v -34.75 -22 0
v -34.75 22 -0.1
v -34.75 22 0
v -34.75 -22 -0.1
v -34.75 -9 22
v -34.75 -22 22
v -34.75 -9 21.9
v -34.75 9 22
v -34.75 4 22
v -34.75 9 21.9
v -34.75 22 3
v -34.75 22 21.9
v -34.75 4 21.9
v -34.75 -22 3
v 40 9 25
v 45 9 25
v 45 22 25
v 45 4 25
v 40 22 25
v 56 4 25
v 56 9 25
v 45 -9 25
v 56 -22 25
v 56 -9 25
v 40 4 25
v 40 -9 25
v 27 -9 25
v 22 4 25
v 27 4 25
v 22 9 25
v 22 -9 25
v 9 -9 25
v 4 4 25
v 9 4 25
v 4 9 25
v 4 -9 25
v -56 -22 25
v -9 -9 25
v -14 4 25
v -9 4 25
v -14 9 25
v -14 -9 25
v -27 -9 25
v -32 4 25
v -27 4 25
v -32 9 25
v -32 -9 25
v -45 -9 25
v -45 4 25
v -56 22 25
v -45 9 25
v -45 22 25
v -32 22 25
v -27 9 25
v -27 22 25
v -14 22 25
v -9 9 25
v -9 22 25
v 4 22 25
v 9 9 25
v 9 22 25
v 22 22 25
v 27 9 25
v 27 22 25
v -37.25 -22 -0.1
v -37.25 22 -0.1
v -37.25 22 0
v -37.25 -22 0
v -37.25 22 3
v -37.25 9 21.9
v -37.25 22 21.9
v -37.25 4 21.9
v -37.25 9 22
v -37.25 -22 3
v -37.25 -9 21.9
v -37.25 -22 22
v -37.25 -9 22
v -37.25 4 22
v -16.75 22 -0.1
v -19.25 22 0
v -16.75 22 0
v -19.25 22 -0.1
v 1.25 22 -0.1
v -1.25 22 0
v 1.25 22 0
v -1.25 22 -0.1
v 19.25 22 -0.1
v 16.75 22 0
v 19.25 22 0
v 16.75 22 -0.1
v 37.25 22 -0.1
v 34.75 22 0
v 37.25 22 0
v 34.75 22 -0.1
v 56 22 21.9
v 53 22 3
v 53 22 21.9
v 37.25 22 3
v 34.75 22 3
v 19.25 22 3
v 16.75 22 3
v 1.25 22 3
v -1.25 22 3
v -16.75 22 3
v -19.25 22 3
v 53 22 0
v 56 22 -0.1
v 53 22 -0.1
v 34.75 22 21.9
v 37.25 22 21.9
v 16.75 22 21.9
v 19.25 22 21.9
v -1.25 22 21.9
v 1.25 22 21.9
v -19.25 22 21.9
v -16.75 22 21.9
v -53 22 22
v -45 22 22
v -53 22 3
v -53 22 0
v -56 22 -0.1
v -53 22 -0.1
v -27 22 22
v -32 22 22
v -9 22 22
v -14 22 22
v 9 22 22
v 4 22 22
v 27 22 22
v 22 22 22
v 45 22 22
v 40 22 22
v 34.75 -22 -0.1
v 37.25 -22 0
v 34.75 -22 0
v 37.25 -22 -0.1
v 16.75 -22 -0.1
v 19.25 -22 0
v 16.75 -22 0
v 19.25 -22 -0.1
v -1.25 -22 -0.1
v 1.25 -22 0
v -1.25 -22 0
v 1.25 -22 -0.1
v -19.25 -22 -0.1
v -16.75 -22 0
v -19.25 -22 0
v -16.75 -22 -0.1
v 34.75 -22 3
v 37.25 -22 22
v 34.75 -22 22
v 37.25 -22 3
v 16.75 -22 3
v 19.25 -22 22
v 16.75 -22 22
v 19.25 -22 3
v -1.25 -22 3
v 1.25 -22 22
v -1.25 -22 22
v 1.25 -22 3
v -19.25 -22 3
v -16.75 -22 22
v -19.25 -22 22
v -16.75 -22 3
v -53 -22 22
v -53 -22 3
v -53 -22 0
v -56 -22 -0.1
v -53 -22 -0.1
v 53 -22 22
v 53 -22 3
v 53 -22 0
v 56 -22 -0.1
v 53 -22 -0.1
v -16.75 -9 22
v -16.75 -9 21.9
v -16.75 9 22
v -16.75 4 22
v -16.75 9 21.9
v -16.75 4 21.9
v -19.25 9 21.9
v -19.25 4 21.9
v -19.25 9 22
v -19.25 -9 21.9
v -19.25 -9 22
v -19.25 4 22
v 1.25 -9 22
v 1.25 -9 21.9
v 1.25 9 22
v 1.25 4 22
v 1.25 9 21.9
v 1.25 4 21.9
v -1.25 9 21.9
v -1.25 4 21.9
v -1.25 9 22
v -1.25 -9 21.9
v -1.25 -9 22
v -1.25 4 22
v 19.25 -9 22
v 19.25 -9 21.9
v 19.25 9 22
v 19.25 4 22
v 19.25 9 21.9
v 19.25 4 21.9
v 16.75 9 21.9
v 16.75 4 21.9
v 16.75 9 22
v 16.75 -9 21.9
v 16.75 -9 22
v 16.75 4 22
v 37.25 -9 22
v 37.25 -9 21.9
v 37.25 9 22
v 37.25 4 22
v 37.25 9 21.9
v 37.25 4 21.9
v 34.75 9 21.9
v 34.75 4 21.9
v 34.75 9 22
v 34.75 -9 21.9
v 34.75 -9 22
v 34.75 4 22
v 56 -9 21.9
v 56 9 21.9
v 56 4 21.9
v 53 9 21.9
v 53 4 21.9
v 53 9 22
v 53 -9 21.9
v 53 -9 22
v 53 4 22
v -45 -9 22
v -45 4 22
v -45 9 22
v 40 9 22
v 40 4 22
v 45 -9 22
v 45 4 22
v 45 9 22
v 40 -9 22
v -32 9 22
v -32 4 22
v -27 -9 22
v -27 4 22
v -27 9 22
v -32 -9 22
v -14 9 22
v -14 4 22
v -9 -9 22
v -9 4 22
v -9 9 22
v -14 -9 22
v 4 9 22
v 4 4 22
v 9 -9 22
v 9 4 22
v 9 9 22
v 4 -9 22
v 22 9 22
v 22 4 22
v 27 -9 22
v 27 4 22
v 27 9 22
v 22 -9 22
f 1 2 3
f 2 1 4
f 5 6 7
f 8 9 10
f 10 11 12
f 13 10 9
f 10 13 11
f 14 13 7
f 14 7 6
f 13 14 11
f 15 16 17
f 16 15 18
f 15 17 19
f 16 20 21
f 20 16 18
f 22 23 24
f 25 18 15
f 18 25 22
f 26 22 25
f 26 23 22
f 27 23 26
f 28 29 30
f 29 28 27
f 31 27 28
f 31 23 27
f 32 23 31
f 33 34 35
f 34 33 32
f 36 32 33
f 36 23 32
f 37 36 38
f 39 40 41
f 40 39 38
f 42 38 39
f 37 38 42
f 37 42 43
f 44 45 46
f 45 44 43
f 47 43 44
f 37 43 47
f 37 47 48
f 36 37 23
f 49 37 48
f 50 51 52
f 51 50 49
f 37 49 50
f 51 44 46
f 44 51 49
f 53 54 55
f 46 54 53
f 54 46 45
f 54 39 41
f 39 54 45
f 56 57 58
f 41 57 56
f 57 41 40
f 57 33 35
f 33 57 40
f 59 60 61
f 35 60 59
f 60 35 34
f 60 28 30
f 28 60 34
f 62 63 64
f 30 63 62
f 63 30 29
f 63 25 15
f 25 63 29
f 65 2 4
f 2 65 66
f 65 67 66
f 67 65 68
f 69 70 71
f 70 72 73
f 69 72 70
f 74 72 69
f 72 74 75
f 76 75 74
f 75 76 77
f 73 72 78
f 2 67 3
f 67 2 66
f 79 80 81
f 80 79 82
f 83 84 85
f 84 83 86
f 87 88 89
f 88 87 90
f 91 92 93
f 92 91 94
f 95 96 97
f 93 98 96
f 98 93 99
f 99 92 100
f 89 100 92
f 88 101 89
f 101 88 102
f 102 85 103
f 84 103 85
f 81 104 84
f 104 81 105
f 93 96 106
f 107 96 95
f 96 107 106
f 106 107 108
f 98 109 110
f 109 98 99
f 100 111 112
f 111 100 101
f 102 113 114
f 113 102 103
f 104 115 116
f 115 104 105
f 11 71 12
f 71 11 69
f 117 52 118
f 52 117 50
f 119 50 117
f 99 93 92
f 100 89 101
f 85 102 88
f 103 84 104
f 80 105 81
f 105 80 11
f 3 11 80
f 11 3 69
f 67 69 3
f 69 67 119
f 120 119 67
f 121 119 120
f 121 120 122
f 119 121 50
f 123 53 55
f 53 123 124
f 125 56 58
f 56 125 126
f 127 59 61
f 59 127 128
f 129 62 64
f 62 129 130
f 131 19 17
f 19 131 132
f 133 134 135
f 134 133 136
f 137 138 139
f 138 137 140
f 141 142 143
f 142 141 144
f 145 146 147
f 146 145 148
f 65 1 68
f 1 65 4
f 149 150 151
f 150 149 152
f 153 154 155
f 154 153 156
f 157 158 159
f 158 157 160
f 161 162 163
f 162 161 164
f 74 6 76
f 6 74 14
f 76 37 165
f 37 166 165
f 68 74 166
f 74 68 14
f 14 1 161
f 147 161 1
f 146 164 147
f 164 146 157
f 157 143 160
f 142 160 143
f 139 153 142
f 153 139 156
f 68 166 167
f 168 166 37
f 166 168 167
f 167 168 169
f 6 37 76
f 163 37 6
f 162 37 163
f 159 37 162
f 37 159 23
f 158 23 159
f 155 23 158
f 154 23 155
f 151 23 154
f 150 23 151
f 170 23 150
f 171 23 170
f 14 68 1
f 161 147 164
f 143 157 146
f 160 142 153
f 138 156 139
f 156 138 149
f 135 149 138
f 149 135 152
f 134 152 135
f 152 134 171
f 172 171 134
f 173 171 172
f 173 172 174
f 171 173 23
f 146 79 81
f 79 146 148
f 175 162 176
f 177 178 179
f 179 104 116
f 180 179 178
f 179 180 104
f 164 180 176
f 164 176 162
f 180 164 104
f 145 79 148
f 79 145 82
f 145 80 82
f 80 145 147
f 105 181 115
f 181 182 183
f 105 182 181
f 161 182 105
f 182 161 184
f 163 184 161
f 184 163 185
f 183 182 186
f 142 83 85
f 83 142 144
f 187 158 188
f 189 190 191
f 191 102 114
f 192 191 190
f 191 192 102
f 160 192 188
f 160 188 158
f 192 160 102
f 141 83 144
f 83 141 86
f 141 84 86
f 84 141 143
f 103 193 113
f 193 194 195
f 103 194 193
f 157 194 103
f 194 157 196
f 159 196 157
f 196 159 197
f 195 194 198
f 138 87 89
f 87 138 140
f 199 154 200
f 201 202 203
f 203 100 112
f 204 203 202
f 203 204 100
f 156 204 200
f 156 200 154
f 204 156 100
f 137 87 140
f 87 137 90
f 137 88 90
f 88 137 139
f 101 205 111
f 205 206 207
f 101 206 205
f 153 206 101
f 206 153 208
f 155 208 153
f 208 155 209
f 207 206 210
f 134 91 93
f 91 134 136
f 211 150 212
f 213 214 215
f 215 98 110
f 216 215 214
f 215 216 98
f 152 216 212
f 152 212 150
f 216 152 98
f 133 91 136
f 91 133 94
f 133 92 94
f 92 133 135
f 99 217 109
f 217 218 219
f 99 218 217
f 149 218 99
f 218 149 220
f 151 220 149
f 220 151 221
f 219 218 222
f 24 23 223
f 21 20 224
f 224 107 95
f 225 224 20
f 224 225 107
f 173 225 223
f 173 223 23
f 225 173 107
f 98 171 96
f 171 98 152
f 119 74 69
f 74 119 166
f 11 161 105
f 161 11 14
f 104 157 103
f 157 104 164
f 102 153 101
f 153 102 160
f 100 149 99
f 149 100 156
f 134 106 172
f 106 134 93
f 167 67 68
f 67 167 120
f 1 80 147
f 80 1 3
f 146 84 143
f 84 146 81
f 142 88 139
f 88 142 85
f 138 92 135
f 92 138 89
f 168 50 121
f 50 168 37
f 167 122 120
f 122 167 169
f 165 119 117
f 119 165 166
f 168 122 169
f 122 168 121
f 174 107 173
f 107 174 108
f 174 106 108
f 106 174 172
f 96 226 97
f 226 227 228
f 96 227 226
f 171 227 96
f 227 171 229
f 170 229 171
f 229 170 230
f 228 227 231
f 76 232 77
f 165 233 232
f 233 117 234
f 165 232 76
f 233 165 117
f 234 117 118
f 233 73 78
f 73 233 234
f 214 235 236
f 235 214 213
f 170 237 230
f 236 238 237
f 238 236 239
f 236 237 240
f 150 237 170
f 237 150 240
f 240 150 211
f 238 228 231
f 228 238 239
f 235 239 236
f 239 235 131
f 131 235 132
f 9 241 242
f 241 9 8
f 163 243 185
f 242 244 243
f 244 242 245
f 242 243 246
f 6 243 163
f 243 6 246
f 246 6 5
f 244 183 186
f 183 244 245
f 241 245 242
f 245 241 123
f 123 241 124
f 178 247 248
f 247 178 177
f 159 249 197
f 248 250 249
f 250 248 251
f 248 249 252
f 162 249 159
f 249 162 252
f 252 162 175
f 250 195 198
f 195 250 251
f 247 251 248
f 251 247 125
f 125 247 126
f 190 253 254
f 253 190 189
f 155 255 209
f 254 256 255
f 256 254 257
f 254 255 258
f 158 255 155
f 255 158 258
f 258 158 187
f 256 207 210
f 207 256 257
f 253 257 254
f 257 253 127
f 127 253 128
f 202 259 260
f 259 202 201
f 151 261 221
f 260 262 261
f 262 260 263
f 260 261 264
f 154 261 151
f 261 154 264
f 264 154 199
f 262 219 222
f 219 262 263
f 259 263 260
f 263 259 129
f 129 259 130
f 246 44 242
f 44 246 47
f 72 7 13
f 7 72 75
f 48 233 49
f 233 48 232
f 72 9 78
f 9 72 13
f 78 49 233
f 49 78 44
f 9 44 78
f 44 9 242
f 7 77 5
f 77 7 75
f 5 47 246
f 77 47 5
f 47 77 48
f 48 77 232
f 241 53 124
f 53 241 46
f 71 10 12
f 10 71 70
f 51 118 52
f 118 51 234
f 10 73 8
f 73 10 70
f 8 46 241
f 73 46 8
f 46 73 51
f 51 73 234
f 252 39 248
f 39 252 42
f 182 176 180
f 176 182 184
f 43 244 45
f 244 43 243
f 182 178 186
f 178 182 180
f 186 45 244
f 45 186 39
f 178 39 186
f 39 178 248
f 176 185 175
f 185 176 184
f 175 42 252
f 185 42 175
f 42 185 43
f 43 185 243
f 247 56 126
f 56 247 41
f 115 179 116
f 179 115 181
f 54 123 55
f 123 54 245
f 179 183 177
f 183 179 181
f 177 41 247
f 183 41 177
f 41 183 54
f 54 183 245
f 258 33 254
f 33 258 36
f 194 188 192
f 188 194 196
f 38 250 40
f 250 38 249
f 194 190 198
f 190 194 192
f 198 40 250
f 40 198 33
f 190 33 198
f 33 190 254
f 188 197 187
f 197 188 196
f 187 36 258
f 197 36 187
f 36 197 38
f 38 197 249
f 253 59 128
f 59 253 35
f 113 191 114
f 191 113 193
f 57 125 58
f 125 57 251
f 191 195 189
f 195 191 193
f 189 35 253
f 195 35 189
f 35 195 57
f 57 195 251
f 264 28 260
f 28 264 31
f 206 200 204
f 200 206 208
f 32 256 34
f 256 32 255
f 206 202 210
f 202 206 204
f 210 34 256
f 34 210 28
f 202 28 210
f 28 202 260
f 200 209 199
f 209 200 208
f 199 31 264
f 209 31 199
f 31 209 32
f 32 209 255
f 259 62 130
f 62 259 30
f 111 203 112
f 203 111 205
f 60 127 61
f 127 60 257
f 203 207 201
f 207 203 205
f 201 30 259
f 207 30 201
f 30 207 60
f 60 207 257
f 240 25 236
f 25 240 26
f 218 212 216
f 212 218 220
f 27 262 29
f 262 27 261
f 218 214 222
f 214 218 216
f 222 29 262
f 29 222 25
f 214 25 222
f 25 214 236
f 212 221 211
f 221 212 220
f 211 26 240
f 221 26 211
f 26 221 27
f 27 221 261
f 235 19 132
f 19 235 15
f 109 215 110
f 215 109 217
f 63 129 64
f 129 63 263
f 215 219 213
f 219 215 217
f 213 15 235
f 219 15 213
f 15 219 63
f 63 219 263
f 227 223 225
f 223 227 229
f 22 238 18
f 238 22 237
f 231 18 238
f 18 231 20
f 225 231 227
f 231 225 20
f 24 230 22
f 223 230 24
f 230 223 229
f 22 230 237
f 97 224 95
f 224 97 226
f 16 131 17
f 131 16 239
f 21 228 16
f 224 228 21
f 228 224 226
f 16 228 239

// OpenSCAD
// Open-sided cuvette rack for twelve 12.5mm square cuvettes.
// Corrected to ensure single manifold body via intersection/embedding
// and correct hole centering and count.

// --- Dimensions ---
base_x      = 112.0;    // Length of base plate (X)
base_y      = 44.0;     // Width of base plate (Y)
base_z      = 3.0;      // Thickness of base plate (Z)

deck_x      = 112.0;    // Length of deck plate (X)
deck_y      = 44.0;     // Width of deck plate (Y)
deck_z_min  = 22.0;     // Bottom of deck plate (Z)
deck_z_max  = 25.0;     // Top of deck plate (Z)

wall_end_t  = 3.0;      // Thickness of end walls (X-direction)
wall_rib_t  = 2.5;      // Thickness of internal ribs (X-direction)
wall_depth  = 44.0;     // Depth of walls (Y-direction)
wall_height = 25.0;     // Total height of walls (Z)

hole_size   = 13.0;     // Size of cuvette holes (X and Y)
hole_pitch  = 18.0;     // Center-to-center spacing of holes (X and Y)
rows        = 2;        // Number of rows (Y)
cols        = 6;        // Number of columns (X)

$fn = 64;

// --- Calculations ---
// To center 6 holes with 18mm pitch:
// Total span = (6-1) * 18 = 90mm.
// Offset from center = 90 / 2 = 45mm.
// First hole center = -45mm.
hole_offset_x = (cols - 1) * hole_pitch / 2;
hole_offset_y = (rows - 1) * hole_pitch / 2;

// --- Geometry ---

module main_structure() {
    // Base Plate
    translate([-base_x/2, -base_y/2, 0])
        cube([base_x, base_y, base_z]);

    // End Walls (Flush with short ends, embedded 0.1mm into base to ensure manifold)
    // Left end wall
    translate([-base_x/2, -base_y/2, -0.1])
        cube([wall_end_t, base_y, wall_height + 0.1]);
    // Right end wall
    translate([base_x/2 - wall_end_t, -base_y/2, -0.1])
        cube([wall_end_t, base_y, wall_height + 0.1]);

    // Internal Ribs
    for (rx = [-36, -18, 0, 18, 36]) {
        translate([rx - wall_rib_t/2, -wall_depth/2, -0.1])
            cube([wall_rib_t, wall_depth, wall_height + 0.1]);
    }
    
    // Deck Plate
    translate([-deck_x/2, -deck_y/2, deck_z_min])
        cube([deck_x, deck_y, deck_z_max - deck_z_min]);
}

// Final Assembly
difference() {
    main_structure();

    // Holes (Cutting through the deck)
    // We use a large Z-range to ensure clean cut through the deck
    for (i = [0 : cols - 1]) {
        for (j = [0 : rows - 1]) {
            translate([
                (i * hole_pitch) - hole_offset_x, 
                (j * hole_pitch) - hole_offset_y, 
                deck_z_min - 0.1
            ])
                cube([hole_size, hole_size, (deck_z_max - deck_z_min) + 0.2]);
        }
    }
}
